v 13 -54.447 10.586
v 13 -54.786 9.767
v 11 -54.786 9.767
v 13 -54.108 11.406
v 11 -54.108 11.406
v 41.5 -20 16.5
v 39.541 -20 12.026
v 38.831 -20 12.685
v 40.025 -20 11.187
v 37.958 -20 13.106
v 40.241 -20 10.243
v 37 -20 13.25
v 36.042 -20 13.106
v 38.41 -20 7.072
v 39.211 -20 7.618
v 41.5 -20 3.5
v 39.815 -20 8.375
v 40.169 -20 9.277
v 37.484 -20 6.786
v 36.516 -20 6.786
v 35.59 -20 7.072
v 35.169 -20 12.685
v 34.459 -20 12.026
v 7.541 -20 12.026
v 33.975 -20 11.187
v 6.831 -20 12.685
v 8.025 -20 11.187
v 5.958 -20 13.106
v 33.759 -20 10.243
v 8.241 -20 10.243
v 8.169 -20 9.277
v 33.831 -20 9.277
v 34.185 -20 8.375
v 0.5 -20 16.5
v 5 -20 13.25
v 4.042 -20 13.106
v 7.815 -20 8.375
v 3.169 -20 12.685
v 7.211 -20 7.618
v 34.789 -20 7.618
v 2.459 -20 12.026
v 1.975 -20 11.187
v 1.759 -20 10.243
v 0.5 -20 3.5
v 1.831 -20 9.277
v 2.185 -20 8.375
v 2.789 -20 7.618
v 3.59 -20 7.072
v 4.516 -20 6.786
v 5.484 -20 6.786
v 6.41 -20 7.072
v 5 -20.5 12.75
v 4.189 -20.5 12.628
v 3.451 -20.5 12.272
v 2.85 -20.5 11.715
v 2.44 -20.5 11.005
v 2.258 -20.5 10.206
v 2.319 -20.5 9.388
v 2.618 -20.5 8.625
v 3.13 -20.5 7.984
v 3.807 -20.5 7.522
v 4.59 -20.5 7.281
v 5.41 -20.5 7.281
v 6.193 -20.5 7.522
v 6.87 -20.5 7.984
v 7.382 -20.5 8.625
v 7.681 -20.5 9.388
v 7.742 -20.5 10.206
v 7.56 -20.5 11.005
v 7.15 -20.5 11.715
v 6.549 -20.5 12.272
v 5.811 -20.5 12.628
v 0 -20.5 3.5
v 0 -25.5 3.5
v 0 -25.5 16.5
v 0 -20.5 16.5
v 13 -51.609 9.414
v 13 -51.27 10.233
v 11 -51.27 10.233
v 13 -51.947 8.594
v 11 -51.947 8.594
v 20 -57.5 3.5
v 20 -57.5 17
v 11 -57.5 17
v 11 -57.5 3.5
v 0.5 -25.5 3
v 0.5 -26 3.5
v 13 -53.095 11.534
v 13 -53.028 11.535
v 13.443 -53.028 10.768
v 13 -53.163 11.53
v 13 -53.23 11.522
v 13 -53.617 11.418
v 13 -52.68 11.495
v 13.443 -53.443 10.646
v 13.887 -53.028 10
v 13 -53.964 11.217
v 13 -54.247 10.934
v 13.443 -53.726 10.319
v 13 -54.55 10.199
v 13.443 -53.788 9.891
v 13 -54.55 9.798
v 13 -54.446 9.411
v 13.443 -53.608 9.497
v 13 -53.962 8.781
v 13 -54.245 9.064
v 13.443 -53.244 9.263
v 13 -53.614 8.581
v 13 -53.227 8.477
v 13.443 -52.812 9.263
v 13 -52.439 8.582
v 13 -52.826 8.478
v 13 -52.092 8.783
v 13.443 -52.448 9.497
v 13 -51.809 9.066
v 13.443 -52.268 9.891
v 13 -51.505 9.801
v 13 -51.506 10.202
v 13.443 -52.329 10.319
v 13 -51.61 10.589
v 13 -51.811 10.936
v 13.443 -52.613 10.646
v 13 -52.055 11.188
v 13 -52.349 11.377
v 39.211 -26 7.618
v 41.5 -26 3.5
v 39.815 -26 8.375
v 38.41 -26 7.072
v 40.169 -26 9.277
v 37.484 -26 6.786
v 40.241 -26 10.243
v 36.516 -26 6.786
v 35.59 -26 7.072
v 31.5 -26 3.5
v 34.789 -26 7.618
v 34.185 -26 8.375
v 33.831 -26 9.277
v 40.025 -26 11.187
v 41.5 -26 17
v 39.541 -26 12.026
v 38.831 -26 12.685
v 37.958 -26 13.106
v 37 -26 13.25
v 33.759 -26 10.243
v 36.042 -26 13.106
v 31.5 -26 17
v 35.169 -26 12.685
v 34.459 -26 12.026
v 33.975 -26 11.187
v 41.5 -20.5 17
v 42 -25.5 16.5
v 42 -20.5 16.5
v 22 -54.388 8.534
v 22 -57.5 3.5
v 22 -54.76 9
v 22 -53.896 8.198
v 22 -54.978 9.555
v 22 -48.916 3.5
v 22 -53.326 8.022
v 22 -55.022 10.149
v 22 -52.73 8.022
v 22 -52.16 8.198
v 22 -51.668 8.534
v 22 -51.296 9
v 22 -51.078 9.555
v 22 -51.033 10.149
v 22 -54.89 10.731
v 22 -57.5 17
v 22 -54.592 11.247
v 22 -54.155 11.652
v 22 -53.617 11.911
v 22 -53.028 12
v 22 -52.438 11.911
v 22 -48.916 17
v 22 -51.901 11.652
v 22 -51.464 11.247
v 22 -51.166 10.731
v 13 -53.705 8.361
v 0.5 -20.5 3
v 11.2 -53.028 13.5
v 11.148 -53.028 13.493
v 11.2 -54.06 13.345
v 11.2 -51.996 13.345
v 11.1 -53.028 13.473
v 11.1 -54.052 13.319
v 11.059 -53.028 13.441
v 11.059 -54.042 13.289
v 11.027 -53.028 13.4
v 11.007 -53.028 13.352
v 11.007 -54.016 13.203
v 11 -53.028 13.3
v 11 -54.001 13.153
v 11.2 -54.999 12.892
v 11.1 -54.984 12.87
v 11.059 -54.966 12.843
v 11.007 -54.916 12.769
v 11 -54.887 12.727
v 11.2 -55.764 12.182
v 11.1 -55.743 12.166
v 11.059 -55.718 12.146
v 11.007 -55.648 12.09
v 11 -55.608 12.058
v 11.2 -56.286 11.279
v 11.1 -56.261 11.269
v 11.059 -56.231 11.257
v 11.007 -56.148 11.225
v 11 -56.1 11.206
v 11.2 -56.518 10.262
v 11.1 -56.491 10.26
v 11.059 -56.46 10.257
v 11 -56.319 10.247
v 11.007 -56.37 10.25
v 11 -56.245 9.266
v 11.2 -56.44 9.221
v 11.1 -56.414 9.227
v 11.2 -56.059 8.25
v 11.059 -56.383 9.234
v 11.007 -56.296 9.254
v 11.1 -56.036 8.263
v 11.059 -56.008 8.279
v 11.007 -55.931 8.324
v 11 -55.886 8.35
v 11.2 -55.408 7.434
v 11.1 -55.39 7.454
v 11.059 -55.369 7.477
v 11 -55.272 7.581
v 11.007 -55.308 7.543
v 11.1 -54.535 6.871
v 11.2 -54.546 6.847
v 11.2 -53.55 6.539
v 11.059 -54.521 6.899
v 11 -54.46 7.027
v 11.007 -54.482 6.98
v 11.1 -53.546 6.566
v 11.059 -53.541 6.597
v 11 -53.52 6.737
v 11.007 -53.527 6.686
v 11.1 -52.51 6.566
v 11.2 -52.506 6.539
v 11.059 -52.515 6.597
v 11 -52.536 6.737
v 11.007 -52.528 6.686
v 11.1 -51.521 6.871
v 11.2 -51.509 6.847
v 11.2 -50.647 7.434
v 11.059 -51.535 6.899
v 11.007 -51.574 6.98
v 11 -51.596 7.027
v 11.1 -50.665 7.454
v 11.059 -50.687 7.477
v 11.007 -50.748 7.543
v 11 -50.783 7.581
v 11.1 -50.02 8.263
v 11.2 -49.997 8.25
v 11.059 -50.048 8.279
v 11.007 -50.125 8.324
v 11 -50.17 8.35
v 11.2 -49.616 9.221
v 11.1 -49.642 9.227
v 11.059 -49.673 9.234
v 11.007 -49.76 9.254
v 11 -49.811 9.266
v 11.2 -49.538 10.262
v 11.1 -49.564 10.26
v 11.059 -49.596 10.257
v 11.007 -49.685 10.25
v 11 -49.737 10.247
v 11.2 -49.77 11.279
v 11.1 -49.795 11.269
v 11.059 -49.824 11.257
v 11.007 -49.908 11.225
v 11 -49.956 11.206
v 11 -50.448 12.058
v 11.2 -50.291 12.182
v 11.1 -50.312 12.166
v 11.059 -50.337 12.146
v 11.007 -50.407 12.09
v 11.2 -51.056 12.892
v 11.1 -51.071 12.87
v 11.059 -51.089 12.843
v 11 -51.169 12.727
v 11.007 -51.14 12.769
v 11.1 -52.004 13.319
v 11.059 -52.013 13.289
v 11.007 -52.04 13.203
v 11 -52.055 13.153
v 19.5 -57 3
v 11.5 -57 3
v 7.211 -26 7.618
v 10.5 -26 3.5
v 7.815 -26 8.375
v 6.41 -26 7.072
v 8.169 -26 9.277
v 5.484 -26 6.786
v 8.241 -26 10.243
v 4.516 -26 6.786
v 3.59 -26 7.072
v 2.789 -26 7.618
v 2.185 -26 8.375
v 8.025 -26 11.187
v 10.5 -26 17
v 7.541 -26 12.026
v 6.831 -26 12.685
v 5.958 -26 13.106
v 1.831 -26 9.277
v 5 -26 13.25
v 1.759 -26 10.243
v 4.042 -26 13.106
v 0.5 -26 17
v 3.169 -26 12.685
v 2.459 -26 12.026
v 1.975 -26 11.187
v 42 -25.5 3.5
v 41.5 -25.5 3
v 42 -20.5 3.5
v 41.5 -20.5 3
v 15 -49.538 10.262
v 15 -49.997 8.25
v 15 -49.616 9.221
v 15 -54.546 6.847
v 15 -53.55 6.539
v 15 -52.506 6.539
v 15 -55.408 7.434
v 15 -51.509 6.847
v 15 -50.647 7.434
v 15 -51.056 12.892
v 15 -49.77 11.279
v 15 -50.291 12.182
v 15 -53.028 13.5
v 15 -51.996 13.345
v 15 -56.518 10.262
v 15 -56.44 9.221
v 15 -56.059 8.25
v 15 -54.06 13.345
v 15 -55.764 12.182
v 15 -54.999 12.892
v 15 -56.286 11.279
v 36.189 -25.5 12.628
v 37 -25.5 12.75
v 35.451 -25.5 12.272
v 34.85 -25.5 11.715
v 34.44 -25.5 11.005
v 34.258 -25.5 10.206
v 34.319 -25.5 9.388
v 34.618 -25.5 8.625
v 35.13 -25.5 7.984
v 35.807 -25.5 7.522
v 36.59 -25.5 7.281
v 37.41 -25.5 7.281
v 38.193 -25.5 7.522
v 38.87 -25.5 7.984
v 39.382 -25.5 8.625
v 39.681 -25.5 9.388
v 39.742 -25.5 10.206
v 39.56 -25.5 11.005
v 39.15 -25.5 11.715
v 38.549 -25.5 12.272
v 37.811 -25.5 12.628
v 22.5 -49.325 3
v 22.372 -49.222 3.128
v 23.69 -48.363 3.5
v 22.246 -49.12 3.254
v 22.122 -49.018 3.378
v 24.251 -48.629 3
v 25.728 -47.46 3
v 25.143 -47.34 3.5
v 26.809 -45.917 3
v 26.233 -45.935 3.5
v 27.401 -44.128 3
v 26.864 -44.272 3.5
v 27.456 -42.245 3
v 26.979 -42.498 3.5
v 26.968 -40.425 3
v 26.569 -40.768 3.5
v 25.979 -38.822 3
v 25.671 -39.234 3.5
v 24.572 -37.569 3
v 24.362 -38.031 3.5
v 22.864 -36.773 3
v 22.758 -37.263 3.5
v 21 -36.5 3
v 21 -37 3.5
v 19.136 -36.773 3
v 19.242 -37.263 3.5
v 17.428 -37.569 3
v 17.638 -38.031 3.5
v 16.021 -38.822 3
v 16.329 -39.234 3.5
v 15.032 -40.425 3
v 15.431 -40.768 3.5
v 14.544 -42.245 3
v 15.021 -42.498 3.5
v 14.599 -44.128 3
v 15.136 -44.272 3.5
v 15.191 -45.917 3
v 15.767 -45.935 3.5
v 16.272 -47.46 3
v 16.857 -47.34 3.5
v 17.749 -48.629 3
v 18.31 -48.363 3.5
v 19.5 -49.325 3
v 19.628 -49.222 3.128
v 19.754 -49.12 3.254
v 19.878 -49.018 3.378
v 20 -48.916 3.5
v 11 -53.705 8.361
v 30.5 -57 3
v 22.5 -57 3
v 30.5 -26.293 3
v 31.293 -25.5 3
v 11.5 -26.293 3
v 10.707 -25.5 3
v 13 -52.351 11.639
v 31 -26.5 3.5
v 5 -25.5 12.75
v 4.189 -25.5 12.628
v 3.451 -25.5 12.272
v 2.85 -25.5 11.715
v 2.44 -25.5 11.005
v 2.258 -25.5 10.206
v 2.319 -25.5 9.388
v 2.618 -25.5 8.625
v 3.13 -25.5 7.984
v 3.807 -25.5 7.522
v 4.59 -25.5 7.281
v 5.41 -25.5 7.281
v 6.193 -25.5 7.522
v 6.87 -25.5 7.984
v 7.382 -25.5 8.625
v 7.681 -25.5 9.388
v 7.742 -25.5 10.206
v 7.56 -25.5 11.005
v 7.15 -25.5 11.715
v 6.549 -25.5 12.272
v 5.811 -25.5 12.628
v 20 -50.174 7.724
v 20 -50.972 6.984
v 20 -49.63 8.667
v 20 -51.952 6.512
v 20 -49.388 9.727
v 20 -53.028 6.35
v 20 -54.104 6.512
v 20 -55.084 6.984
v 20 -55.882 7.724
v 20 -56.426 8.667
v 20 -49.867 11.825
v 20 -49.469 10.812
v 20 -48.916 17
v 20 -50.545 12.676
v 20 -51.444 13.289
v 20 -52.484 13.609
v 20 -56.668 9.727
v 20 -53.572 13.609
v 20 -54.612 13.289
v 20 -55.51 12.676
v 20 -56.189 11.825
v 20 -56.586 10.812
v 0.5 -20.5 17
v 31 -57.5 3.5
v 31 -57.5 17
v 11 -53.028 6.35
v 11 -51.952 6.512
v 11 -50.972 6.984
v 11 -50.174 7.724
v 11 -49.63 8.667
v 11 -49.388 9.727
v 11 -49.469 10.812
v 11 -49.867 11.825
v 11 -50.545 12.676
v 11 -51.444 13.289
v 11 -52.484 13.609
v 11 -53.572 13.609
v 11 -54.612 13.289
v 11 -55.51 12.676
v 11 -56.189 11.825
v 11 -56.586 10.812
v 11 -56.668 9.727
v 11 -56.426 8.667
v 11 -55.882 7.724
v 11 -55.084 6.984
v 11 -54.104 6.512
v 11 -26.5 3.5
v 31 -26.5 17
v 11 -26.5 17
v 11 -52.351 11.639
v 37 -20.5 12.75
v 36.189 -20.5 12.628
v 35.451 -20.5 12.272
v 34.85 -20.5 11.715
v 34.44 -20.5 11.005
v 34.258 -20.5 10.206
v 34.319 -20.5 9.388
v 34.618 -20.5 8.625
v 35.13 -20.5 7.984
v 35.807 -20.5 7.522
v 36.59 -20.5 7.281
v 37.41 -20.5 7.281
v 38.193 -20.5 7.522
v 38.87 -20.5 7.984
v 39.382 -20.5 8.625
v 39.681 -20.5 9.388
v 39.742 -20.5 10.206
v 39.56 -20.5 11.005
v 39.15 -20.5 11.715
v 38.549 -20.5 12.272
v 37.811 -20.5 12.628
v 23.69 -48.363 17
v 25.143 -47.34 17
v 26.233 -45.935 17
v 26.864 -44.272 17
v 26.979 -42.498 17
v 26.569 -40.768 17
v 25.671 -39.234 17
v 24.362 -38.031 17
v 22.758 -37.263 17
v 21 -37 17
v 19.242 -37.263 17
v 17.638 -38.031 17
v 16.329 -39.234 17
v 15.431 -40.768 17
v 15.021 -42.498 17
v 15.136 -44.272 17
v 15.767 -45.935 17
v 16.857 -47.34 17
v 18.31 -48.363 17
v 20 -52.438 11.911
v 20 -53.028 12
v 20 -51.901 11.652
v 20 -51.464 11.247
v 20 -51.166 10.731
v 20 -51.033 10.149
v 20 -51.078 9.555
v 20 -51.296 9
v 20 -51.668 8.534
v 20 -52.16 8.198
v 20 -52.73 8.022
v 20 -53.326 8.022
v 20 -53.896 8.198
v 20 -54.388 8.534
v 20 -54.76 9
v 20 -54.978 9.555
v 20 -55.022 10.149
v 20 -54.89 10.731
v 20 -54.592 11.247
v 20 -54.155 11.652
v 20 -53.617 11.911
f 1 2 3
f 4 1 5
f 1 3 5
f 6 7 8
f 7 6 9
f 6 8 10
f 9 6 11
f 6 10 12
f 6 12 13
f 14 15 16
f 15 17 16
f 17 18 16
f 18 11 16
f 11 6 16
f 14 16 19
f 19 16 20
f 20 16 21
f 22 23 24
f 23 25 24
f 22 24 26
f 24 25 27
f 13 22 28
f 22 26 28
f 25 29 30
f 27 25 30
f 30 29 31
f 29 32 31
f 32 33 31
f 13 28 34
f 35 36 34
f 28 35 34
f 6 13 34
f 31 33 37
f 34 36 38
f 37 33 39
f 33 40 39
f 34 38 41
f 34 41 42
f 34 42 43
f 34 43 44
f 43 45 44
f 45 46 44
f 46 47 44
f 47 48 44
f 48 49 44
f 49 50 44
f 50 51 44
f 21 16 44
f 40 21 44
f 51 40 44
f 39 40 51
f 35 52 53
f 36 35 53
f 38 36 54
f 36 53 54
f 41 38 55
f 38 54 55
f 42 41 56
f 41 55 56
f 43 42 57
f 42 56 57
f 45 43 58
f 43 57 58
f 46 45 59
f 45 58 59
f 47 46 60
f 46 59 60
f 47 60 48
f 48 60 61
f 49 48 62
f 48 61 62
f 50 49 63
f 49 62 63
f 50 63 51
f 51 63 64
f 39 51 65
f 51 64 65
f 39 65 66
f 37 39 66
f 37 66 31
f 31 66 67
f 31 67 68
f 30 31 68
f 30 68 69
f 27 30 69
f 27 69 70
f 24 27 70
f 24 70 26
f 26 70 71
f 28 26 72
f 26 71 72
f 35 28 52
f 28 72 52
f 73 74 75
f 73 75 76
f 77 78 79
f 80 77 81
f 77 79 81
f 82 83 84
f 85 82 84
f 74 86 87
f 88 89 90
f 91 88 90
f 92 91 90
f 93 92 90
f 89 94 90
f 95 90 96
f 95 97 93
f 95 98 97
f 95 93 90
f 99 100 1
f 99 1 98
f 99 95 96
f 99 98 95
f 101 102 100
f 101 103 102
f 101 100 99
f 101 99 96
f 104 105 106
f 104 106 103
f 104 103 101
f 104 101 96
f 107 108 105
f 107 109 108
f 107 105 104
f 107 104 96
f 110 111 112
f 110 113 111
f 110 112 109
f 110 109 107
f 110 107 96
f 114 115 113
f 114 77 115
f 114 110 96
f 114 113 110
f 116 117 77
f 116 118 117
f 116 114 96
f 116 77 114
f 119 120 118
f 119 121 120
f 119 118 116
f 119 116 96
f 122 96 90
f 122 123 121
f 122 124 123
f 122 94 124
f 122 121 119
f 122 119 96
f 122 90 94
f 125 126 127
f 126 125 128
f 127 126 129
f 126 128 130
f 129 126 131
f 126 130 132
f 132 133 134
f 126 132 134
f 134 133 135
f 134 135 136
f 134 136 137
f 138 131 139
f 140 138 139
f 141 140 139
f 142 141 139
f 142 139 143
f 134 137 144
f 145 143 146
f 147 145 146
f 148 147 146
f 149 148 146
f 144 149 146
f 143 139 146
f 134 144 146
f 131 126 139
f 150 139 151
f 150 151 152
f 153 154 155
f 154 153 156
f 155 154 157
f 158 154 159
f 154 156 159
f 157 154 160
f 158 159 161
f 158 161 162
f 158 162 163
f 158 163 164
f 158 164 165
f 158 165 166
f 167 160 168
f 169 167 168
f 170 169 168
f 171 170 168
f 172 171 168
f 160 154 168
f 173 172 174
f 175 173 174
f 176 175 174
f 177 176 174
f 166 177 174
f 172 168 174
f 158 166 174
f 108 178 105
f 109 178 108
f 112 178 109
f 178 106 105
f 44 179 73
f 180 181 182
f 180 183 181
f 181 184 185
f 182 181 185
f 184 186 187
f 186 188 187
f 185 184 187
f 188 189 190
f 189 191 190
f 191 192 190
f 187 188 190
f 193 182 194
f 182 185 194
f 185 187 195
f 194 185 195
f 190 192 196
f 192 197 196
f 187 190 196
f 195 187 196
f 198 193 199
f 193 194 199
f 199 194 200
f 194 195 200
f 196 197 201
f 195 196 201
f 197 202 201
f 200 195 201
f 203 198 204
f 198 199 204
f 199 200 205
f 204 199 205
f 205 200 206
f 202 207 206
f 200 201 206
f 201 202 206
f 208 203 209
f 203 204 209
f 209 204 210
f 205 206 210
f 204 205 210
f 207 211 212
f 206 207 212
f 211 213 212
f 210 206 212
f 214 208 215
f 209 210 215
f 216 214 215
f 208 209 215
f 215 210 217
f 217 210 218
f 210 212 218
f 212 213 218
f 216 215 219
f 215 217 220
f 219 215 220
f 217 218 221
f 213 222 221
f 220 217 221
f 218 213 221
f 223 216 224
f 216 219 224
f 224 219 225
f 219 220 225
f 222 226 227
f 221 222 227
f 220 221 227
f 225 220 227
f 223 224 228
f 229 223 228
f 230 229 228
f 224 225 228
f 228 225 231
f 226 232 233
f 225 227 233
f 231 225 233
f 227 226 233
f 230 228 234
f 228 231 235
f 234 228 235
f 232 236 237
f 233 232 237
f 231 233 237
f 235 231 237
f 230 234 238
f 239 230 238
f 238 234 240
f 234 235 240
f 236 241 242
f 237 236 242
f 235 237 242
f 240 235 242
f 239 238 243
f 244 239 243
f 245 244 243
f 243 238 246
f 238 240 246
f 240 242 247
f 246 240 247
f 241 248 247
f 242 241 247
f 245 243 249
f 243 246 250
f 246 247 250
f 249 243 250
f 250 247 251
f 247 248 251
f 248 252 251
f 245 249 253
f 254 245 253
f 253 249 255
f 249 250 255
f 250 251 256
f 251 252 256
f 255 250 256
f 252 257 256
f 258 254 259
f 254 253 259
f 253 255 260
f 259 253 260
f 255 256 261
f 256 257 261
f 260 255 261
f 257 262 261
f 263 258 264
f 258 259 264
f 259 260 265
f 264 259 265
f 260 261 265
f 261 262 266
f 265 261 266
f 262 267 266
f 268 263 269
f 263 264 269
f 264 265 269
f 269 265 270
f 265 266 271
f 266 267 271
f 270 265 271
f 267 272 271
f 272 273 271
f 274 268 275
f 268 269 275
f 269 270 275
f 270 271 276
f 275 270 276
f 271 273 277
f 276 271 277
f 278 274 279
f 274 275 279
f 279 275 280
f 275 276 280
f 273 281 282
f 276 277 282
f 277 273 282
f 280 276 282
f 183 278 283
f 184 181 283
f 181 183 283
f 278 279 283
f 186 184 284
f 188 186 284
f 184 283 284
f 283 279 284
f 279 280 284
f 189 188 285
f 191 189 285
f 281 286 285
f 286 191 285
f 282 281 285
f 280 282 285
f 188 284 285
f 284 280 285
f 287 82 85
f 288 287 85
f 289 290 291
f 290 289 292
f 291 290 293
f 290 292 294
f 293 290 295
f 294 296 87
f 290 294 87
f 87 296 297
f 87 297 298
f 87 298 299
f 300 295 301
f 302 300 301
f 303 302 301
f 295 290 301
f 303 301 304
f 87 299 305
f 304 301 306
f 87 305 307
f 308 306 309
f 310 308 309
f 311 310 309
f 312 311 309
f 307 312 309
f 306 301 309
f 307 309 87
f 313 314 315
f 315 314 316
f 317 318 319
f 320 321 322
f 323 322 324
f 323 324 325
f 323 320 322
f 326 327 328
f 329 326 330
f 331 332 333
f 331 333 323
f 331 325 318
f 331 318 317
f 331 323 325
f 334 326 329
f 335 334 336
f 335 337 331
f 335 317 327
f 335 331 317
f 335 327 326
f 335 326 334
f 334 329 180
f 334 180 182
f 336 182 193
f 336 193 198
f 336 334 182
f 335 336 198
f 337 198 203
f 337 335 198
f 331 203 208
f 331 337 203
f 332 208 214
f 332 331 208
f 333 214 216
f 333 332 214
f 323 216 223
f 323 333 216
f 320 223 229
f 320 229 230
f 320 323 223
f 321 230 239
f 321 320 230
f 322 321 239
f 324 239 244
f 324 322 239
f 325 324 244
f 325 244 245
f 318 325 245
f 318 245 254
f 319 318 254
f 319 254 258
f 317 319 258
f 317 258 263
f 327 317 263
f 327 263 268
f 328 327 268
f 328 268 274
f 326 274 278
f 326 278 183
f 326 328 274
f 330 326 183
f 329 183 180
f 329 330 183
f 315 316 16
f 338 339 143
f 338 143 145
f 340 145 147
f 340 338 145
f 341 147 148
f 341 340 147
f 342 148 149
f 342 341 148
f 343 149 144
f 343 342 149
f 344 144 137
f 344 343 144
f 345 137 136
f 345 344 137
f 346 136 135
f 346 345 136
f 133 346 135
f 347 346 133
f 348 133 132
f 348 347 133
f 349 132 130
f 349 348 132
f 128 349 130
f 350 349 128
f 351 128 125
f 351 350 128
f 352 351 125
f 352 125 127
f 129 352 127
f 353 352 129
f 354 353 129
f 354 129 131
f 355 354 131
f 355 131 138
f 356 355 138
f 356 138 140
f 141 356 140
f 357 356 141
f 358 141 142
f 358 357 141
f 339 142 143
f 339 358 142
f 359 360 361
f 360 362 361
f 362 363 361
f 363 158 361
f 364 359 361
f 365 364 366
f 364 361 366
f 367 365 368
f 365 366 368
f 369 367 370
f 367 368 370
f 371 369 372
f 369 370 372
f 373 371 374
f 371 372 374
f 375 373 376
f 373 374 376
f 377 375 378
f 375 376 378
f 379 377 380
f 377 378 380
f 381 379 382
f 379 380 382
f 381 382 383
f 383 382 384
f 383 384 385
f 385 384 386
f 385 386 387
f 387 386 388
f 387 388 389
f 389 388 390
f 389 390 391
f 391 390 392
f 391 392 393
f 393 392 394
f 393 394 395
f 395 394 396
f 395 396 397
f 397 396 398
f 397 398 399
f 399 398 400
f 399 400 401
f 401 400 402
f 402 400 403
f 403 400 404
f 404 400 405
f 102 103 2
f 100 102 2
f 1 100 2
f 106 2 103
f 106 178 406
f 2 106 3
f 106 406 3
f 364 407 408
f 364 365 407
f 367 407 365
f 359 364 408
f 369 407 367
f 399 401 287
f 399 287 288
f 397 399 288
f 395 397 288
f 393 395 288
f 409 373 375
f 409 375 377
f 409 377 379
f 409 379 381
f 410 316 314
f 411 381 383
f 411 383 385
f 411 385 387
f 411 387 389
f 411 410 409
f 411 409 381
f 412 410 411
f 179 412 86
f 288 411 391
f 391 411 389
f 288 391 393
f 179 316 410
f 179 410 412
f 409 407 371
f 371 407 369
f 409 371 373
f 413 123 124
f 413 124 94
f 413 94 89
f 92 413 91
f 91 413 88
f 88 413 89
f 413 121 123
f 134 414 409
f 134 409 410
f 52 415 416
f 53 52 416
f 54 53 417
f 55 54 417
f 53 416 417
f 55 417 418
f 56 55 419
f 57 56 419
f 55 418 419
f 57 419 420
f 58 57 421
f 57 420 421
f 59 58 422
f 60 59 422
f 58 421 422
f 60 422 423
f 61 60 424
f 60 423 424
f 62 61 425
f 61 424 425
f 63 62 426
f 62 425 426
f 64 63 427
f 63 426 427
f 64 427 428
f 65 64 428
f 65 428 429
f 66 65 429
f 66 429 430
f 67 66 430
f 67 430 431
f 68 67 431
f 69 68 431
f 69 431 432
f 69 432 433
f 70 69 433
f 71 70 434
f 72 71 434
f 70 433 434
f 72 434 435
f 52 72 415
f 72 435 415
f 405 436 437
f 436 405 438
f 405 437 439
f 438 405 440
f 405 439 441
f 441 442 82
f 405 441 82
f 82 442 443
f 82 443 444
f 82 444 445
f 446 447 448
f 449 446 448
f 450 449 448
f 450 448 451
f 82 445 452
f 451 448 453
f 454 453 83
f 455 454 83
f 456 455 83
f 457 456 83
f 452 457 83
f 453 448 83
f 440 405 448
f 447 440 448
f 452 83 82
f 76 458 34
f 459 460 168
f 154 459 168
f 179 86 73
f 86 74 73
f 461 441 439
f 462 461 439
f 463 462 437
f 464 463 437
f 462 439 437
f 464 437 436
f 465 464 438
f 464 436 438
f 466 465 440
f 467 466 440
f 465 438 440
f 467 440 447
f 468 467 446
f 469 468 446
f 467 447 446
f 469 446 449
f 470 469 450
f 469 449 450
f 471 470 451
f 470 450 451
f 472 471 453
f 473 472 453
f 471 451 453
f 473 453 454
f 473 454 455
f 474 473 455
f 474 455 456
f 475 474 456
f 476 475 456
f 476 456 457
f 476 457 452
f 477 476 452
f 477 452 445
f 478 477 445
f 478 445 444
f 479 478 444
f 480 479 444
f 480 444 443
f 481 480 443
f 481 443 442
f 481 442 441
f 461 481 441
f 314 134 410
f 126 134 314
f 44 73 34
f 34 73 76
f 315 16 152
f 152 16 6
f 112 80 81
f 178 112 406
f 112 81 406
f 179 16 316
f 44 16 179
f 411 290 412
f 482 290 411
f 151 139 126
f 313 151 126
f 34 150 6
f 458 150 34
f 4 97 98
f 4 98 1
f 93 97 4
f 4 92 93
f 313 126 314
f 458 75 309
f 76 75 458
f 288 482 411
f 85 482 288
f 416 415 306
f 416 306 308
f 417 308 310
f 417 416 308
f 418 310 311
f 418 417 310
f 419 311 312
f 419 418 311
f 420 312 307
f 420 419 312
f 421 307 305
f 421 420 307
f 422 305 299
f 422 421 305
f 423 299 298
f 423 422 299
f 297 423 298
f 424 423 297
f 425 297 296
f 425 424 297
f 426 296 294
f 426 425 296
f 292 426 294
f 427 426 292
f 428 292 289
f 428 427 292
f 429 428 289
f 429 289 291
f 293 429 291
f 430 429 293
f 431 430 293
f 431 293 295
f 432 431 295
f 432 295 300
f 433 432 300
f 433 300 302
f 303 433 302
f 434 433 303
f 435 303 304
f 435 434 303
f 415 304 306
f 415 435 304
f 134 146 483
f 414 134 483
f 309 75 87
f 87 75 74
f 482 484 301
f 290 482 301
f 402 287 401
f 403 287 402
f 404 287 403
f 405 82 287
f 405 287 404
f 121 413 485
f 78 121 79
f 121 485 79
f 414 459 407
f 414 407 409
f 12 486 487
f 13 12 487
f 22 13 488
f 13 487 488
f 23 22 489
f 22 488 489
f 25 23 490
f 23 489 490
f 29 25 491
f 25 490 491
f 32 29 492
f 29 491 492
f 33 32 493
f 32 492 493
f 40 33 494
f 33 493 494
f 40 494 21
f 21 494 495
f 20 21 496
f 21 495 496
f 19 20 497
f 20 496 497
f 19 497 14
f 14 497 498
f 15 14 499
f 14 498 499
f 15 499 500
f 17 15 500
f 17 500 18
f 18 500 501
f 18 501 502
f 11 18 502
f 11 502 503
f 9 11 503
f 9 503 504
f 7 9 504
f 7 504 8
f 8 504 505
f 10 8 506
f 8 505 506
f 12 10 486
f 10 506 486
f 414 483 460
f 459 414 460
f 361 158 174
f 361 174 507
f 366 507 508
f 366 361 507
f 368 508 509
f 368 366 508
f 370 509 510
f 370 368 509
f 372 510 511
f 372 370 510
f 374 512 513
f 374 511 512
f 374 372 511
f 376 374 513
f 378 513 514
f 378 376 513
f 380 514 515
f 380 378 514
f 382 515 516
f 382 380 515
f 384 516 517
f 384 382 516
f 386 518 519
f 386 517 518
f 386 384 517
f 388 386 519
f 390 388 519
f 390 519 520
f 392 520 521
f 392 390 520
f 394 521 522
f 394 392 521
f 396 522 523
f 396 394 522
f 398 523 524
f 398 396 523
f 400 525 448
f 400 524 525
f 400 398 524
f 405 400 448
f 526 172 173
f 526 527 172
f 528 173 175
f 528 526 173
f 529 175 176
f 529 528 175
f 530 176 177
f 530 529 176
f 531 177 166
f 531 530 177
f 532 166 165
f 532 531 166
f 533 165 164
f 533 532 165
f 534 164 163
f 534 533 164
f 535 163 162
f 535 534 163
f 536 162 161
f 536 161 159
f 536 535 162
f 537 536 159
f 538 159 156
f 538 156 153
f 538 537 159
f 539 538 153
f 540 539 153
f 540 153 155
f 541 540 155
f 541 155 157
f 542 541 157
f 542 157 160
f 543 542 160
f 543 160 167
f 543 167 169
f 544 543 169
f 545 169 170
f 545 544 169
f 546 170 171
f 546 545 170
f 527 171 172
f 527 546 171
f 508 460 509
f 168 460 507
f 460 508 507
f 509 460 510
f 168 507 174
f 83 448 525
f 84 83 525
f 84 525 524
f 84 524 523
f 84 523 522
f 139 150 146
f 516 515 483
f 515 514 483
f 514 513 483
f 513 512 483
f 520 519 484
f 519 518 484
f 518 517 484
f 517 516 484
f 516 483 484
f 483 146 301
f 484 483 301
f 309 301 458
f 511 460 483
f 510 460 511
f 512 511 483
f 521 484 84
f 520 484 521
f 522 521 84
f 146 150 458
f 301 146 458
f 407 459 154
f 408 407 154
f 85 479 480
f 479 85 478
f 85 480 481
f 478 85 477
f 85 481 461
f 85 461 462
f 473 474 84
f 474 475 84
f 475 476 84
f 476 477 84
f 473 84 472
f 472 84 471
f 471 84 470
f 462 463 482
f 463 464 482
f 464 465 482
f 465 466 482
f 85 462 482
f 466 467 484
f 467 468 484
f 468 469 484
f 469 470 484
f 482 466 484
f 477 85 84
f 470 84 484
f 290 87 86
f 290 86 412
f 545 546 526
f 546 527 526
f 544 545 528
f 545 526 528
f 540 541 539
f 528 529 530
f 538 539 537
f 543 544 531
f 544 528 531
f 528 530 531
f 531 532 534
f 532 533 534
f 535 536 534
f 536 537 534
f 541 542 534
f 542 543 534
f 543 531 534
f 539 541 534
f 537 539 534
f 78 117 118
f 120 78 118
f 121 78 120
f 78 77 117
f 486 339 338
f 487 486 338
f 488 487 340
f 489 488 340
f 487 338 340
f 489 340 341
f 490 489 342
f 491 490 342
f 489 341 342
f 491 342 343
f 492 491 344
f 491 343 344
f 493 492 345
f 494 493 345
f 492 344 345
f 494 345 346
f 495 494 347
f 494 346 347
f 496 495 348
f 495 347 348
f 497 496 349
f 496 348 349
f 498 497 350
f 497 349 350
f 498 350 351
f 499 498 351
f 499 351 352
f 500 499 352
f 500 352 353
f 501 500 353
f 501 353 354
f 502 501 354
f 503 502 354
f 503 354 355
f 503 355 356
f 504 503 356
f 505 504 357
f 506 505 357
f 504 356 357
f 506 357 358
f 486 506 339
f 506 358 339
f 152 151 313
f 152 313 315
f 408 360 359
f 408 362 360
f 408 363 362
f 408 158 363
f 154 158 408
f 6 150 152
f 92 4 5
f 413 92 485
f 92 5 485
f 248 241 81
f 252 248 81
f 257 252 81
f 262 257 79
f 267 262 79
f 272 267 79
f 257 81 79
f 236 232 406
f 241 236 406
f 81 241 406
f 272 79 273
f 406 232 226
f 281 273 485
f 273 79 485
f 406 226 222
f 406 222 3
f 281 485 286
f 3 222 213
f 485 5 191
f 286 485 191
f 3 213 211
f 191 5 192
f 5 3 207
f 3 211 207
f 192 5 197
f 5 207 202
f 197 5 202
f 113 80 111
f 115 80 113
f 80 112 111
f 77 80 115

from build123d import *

# Parameters (mm, degrees)
SKETCH1_W                           = 42
SKETCH1_H                           = 37.5
BOSS_EXTRUDE1_DEPTH                 = 14
CUT_EXTRUDE1_DEPTH                  = 73.568932747
CUT_EXTRUDE2_DEPTH                  = 73.568932747
CUT_EXTRUDE3_DEPTH                  = 73.568932747
F_7_3_7_3_DIAMETER_HOLE1_D          = 7.3
F_7_3_7_3_DIAMETER_HOLE1_DEPTH      = 9
SKETCH7_R                           = 3.5
BOSS_EXTRUDE2_DEPTH                 = 4
CUT_EXTRUDE4_DEPTH                  = 2
SKETCH9_W                           = 6
SKETCH9_H                           = 14
SKETCH11_W                          = 2
SKETCH11_H                          = 2
SKETCH12_W                          = 2.75
SKETCH12_H                          = 6
F_5_5_5_5_DIAMETER_HOLE1_AT_2_COUNT = 2
F_5_5_5_5_DIAMETER_HOLE1_AT_2_PITCH = 32
CHAMFER1_SIZE                       = 0.5
FILLET1_R                           = 0.2


with BuildPart() as part:
    # Sketch1 → Boss-Extrude1 (new body)
    with BuildSketch(Plane(origin=(0, 0, 3), x_dir=(-1, 0, 0), z_dir=(0, 0, -1))):
        with Locations((-21, -38.75)):
            Rectangle(SKETCH1_W, SKETCH1_H)
    extrude(amount=-BOSS_EXTRUDE1_DEPTH)

    # Sketch2 → Cut-Extrude1 (cut, through all)
    with BuildSketch(Plane.XY.offset(17)):
        Polygon((31, -26.5), (31, -57.5), (42, -57.5), (42, -26), (31.5, -26), align=None)
    extrude(amount=-CUT_EXTRUDE1_DEPTH, mode=Mode.SUBTRACT)

    # Sketch3 → Cut-Extrude2 (cut, through all)
    with BuildSketch(Plane.XY.offset(17)):
        with BuildLine():
            Line((20, -57.5), (22, -57.5))
            Line((22, -57.5), (22, -48.916079783))
            ThreePointArc((22, -48.916079783), (21, -49), (20, -48.916079783))
            Line((20, -48.916079783), (20, -57.5))
        make_face()
    extrude(amount=-CUT_EXTRUDE2_DEPTH, mode=Mode.SUBTRACT)

    # Sketch4 → Cut-Extrude3 (cut, through all)
    with BuildSketch(Plane.XY.offset(17)):
        Polygon((11, -26.5), (10.5, -26), (0, -26), (0, -57.5), (11, -57.5), align=None)
    extrude(amount=-CUT_EXTRUDE3_DEPTH, mode=Mode.SUBTRACT)

    # Ø7.3 (7.3) Diameter Hole1
    with Locations(Plane.ZY.offset(-11)):
        with Locations((10, -53.027864045)):
            Hole(F_7_3_7_3_DIAMETER_HOLE1_D / 2, depth=F_7_3_7_3_DIAMETER_HOLE1_DEPTH)

    # Sketch9 → Cut-Revolve1 (revolve, cut)
    with BuildSketch(Plane(origin=(0, -43, 0), x_dir=(1, 0, 0), z_dir=(0, 1, 0))):
        with Locations((24, -10)):
            Rectangle(SKETCH9_W, SKETCH9_H)
    revolve(axis=Axis((21, -43, 3), (0, 0, 1)), mode=Mode.SUBTRACT)

    # Sketch11 → Revolve1 (revolve)
    with BuildSketch(Plane(origin=(0, 0, 10), x_dir=(-1, 0, 0), z_dir=(0, 0, -1)), mode=Mode.PRIVATE) as revolve1_sk:
        with Locations((-21, -52.027864045)):
            Rectangle(SKETCH11_W, SKETCH11_H)
    revolve(revolve1_sk.sketch.rotate(Axis((22, -53.027864045, 10), (-1, 0, 0)), 270), axis=Axis((22, -53.027864045, 10), (-1, 0, 0)))

    # Sketch12 → Ø5.5 (5.5) Diameter Hole1 (revolve, cut)
    with BuildSketch(Plane(origin=(37, -20, 10), x_dir=(0, 0, 1), z_dir=(1, 0, 0))):
        with Locations((1.375, 3)):
            Rectangle(SKETCH12_W, SKETCH12_H)
    f_5_5_5_5_diameter_hole1 = revolve(axis=Axis((37, -13.65, 10), (0, -1, 0)), mode=Mode.SUBTRACT)

    # Ø5.5 (5.5) Diameter Hole1 at 2: Ø5.5 (5.5) Diameter Hole1 ×2
    with Locations(*[(-i * F_5_5_5_5_DIAMETER_HOLE1_AT_2_PITCH, 0, 0) for i in range(1, F_5_5_5_5_DIAMETER_HOLE1_AT_2_COUNT)]):
        add(f_5_5_5_5_diameter_hole1, mode=Mode.SUBTRACT)

    # Chamfer1
    chamfer1_edges = [part.edges().sort_by_distance(p)[0] for p in [
        (37, -20, 7.25),
        (37, -26, 7.25),
        (26.5, -57.5, 3),
        (31.25, -26.25, 3),
        (36.75, -26, 3),
        (42, -26, 10),
        (31, -42, 3),
        (15.5, -57.5, 3),
        (20, -53.208039892, 3),
        (22, -53.208039892, 3),
        (21, -20, 17),
        (0, -23, 3),
        (0, -23, 17),
        (11, -42, 3),
        (42, -23, 3),
        (5.25, -26, 3),
        (0, -26, 10),
        (10.75, -26.25, 3),
        (21, -20, 3),
        (42, -23, 17),
        (0, -20, 10),
        (42, -20, 10),
        (21, -37, 3),
        (5, -20, 7.25),
        (5, -26, 7.25),
    ]]
    chamfer(chamfer1_edges, length=CHAMFER1_SIZE)


with BuildPart() as body_2:
    # Sketch7 → Boss-Extrude2 (new body)
    with BuildSketch(Plane(origin=(15, 0, 0), x_dir=(0, 0, -1), z_dir=(1, 0, 0))):
        with Locations(Location((-10, -53.027864045, 0), (0, 0, 180))):
            Circle(SKETCH7_R)
    extrude(amount=-BOSS_EXTRUDE2_DEPTH)

    # Sketch8 → Cut-Extrude4 (cut)
    with BuildSketch(Plane.ZY.offset(-11)):
        Polygon((11.405674452, -54.108493338), (11.638689646, -52.350828907), (10.233015194, -51.270199614), (8.594325548, -51.947234752), (8.361310354, -53.704899183), (9.766984806, -54.785528476), align=None)
    extrude(amount=-CUT_EXTRUDE4_DEPTH, mode=Mode.SUBTRACT)

    # Sketch10 → Cut-Revolve2 (revolve, cut)
    with BuildSketch(Plane.XY.offset(10), mode=Mode.PRIVATE) as cut_revolve2_sk:
        Polygon((12.999999999, -51.492364045), (12.999999999, -53.027864045), (13.886521338, -53.027864045), align=None)
    revolve(cut_revolve2_sk.sketch.rotate(Axis((12.999974999, -53.027864045, 10), (1, 0, 0)), 90), axis=Axis((12.999974999, -53.027864045, 10), (1, 0, 0)), mode=Mode.SUBTRACT)

    # Fillet1
    fillet1_edges = [body_2.edges().sort_by_distance(p)[0] for p in [
        (11, -53.027864045, 6.5),
    ]]
    fillet(fillet1_edges, radius=FILLET1_R)


solid = Compound([part.part, body_2.part])
